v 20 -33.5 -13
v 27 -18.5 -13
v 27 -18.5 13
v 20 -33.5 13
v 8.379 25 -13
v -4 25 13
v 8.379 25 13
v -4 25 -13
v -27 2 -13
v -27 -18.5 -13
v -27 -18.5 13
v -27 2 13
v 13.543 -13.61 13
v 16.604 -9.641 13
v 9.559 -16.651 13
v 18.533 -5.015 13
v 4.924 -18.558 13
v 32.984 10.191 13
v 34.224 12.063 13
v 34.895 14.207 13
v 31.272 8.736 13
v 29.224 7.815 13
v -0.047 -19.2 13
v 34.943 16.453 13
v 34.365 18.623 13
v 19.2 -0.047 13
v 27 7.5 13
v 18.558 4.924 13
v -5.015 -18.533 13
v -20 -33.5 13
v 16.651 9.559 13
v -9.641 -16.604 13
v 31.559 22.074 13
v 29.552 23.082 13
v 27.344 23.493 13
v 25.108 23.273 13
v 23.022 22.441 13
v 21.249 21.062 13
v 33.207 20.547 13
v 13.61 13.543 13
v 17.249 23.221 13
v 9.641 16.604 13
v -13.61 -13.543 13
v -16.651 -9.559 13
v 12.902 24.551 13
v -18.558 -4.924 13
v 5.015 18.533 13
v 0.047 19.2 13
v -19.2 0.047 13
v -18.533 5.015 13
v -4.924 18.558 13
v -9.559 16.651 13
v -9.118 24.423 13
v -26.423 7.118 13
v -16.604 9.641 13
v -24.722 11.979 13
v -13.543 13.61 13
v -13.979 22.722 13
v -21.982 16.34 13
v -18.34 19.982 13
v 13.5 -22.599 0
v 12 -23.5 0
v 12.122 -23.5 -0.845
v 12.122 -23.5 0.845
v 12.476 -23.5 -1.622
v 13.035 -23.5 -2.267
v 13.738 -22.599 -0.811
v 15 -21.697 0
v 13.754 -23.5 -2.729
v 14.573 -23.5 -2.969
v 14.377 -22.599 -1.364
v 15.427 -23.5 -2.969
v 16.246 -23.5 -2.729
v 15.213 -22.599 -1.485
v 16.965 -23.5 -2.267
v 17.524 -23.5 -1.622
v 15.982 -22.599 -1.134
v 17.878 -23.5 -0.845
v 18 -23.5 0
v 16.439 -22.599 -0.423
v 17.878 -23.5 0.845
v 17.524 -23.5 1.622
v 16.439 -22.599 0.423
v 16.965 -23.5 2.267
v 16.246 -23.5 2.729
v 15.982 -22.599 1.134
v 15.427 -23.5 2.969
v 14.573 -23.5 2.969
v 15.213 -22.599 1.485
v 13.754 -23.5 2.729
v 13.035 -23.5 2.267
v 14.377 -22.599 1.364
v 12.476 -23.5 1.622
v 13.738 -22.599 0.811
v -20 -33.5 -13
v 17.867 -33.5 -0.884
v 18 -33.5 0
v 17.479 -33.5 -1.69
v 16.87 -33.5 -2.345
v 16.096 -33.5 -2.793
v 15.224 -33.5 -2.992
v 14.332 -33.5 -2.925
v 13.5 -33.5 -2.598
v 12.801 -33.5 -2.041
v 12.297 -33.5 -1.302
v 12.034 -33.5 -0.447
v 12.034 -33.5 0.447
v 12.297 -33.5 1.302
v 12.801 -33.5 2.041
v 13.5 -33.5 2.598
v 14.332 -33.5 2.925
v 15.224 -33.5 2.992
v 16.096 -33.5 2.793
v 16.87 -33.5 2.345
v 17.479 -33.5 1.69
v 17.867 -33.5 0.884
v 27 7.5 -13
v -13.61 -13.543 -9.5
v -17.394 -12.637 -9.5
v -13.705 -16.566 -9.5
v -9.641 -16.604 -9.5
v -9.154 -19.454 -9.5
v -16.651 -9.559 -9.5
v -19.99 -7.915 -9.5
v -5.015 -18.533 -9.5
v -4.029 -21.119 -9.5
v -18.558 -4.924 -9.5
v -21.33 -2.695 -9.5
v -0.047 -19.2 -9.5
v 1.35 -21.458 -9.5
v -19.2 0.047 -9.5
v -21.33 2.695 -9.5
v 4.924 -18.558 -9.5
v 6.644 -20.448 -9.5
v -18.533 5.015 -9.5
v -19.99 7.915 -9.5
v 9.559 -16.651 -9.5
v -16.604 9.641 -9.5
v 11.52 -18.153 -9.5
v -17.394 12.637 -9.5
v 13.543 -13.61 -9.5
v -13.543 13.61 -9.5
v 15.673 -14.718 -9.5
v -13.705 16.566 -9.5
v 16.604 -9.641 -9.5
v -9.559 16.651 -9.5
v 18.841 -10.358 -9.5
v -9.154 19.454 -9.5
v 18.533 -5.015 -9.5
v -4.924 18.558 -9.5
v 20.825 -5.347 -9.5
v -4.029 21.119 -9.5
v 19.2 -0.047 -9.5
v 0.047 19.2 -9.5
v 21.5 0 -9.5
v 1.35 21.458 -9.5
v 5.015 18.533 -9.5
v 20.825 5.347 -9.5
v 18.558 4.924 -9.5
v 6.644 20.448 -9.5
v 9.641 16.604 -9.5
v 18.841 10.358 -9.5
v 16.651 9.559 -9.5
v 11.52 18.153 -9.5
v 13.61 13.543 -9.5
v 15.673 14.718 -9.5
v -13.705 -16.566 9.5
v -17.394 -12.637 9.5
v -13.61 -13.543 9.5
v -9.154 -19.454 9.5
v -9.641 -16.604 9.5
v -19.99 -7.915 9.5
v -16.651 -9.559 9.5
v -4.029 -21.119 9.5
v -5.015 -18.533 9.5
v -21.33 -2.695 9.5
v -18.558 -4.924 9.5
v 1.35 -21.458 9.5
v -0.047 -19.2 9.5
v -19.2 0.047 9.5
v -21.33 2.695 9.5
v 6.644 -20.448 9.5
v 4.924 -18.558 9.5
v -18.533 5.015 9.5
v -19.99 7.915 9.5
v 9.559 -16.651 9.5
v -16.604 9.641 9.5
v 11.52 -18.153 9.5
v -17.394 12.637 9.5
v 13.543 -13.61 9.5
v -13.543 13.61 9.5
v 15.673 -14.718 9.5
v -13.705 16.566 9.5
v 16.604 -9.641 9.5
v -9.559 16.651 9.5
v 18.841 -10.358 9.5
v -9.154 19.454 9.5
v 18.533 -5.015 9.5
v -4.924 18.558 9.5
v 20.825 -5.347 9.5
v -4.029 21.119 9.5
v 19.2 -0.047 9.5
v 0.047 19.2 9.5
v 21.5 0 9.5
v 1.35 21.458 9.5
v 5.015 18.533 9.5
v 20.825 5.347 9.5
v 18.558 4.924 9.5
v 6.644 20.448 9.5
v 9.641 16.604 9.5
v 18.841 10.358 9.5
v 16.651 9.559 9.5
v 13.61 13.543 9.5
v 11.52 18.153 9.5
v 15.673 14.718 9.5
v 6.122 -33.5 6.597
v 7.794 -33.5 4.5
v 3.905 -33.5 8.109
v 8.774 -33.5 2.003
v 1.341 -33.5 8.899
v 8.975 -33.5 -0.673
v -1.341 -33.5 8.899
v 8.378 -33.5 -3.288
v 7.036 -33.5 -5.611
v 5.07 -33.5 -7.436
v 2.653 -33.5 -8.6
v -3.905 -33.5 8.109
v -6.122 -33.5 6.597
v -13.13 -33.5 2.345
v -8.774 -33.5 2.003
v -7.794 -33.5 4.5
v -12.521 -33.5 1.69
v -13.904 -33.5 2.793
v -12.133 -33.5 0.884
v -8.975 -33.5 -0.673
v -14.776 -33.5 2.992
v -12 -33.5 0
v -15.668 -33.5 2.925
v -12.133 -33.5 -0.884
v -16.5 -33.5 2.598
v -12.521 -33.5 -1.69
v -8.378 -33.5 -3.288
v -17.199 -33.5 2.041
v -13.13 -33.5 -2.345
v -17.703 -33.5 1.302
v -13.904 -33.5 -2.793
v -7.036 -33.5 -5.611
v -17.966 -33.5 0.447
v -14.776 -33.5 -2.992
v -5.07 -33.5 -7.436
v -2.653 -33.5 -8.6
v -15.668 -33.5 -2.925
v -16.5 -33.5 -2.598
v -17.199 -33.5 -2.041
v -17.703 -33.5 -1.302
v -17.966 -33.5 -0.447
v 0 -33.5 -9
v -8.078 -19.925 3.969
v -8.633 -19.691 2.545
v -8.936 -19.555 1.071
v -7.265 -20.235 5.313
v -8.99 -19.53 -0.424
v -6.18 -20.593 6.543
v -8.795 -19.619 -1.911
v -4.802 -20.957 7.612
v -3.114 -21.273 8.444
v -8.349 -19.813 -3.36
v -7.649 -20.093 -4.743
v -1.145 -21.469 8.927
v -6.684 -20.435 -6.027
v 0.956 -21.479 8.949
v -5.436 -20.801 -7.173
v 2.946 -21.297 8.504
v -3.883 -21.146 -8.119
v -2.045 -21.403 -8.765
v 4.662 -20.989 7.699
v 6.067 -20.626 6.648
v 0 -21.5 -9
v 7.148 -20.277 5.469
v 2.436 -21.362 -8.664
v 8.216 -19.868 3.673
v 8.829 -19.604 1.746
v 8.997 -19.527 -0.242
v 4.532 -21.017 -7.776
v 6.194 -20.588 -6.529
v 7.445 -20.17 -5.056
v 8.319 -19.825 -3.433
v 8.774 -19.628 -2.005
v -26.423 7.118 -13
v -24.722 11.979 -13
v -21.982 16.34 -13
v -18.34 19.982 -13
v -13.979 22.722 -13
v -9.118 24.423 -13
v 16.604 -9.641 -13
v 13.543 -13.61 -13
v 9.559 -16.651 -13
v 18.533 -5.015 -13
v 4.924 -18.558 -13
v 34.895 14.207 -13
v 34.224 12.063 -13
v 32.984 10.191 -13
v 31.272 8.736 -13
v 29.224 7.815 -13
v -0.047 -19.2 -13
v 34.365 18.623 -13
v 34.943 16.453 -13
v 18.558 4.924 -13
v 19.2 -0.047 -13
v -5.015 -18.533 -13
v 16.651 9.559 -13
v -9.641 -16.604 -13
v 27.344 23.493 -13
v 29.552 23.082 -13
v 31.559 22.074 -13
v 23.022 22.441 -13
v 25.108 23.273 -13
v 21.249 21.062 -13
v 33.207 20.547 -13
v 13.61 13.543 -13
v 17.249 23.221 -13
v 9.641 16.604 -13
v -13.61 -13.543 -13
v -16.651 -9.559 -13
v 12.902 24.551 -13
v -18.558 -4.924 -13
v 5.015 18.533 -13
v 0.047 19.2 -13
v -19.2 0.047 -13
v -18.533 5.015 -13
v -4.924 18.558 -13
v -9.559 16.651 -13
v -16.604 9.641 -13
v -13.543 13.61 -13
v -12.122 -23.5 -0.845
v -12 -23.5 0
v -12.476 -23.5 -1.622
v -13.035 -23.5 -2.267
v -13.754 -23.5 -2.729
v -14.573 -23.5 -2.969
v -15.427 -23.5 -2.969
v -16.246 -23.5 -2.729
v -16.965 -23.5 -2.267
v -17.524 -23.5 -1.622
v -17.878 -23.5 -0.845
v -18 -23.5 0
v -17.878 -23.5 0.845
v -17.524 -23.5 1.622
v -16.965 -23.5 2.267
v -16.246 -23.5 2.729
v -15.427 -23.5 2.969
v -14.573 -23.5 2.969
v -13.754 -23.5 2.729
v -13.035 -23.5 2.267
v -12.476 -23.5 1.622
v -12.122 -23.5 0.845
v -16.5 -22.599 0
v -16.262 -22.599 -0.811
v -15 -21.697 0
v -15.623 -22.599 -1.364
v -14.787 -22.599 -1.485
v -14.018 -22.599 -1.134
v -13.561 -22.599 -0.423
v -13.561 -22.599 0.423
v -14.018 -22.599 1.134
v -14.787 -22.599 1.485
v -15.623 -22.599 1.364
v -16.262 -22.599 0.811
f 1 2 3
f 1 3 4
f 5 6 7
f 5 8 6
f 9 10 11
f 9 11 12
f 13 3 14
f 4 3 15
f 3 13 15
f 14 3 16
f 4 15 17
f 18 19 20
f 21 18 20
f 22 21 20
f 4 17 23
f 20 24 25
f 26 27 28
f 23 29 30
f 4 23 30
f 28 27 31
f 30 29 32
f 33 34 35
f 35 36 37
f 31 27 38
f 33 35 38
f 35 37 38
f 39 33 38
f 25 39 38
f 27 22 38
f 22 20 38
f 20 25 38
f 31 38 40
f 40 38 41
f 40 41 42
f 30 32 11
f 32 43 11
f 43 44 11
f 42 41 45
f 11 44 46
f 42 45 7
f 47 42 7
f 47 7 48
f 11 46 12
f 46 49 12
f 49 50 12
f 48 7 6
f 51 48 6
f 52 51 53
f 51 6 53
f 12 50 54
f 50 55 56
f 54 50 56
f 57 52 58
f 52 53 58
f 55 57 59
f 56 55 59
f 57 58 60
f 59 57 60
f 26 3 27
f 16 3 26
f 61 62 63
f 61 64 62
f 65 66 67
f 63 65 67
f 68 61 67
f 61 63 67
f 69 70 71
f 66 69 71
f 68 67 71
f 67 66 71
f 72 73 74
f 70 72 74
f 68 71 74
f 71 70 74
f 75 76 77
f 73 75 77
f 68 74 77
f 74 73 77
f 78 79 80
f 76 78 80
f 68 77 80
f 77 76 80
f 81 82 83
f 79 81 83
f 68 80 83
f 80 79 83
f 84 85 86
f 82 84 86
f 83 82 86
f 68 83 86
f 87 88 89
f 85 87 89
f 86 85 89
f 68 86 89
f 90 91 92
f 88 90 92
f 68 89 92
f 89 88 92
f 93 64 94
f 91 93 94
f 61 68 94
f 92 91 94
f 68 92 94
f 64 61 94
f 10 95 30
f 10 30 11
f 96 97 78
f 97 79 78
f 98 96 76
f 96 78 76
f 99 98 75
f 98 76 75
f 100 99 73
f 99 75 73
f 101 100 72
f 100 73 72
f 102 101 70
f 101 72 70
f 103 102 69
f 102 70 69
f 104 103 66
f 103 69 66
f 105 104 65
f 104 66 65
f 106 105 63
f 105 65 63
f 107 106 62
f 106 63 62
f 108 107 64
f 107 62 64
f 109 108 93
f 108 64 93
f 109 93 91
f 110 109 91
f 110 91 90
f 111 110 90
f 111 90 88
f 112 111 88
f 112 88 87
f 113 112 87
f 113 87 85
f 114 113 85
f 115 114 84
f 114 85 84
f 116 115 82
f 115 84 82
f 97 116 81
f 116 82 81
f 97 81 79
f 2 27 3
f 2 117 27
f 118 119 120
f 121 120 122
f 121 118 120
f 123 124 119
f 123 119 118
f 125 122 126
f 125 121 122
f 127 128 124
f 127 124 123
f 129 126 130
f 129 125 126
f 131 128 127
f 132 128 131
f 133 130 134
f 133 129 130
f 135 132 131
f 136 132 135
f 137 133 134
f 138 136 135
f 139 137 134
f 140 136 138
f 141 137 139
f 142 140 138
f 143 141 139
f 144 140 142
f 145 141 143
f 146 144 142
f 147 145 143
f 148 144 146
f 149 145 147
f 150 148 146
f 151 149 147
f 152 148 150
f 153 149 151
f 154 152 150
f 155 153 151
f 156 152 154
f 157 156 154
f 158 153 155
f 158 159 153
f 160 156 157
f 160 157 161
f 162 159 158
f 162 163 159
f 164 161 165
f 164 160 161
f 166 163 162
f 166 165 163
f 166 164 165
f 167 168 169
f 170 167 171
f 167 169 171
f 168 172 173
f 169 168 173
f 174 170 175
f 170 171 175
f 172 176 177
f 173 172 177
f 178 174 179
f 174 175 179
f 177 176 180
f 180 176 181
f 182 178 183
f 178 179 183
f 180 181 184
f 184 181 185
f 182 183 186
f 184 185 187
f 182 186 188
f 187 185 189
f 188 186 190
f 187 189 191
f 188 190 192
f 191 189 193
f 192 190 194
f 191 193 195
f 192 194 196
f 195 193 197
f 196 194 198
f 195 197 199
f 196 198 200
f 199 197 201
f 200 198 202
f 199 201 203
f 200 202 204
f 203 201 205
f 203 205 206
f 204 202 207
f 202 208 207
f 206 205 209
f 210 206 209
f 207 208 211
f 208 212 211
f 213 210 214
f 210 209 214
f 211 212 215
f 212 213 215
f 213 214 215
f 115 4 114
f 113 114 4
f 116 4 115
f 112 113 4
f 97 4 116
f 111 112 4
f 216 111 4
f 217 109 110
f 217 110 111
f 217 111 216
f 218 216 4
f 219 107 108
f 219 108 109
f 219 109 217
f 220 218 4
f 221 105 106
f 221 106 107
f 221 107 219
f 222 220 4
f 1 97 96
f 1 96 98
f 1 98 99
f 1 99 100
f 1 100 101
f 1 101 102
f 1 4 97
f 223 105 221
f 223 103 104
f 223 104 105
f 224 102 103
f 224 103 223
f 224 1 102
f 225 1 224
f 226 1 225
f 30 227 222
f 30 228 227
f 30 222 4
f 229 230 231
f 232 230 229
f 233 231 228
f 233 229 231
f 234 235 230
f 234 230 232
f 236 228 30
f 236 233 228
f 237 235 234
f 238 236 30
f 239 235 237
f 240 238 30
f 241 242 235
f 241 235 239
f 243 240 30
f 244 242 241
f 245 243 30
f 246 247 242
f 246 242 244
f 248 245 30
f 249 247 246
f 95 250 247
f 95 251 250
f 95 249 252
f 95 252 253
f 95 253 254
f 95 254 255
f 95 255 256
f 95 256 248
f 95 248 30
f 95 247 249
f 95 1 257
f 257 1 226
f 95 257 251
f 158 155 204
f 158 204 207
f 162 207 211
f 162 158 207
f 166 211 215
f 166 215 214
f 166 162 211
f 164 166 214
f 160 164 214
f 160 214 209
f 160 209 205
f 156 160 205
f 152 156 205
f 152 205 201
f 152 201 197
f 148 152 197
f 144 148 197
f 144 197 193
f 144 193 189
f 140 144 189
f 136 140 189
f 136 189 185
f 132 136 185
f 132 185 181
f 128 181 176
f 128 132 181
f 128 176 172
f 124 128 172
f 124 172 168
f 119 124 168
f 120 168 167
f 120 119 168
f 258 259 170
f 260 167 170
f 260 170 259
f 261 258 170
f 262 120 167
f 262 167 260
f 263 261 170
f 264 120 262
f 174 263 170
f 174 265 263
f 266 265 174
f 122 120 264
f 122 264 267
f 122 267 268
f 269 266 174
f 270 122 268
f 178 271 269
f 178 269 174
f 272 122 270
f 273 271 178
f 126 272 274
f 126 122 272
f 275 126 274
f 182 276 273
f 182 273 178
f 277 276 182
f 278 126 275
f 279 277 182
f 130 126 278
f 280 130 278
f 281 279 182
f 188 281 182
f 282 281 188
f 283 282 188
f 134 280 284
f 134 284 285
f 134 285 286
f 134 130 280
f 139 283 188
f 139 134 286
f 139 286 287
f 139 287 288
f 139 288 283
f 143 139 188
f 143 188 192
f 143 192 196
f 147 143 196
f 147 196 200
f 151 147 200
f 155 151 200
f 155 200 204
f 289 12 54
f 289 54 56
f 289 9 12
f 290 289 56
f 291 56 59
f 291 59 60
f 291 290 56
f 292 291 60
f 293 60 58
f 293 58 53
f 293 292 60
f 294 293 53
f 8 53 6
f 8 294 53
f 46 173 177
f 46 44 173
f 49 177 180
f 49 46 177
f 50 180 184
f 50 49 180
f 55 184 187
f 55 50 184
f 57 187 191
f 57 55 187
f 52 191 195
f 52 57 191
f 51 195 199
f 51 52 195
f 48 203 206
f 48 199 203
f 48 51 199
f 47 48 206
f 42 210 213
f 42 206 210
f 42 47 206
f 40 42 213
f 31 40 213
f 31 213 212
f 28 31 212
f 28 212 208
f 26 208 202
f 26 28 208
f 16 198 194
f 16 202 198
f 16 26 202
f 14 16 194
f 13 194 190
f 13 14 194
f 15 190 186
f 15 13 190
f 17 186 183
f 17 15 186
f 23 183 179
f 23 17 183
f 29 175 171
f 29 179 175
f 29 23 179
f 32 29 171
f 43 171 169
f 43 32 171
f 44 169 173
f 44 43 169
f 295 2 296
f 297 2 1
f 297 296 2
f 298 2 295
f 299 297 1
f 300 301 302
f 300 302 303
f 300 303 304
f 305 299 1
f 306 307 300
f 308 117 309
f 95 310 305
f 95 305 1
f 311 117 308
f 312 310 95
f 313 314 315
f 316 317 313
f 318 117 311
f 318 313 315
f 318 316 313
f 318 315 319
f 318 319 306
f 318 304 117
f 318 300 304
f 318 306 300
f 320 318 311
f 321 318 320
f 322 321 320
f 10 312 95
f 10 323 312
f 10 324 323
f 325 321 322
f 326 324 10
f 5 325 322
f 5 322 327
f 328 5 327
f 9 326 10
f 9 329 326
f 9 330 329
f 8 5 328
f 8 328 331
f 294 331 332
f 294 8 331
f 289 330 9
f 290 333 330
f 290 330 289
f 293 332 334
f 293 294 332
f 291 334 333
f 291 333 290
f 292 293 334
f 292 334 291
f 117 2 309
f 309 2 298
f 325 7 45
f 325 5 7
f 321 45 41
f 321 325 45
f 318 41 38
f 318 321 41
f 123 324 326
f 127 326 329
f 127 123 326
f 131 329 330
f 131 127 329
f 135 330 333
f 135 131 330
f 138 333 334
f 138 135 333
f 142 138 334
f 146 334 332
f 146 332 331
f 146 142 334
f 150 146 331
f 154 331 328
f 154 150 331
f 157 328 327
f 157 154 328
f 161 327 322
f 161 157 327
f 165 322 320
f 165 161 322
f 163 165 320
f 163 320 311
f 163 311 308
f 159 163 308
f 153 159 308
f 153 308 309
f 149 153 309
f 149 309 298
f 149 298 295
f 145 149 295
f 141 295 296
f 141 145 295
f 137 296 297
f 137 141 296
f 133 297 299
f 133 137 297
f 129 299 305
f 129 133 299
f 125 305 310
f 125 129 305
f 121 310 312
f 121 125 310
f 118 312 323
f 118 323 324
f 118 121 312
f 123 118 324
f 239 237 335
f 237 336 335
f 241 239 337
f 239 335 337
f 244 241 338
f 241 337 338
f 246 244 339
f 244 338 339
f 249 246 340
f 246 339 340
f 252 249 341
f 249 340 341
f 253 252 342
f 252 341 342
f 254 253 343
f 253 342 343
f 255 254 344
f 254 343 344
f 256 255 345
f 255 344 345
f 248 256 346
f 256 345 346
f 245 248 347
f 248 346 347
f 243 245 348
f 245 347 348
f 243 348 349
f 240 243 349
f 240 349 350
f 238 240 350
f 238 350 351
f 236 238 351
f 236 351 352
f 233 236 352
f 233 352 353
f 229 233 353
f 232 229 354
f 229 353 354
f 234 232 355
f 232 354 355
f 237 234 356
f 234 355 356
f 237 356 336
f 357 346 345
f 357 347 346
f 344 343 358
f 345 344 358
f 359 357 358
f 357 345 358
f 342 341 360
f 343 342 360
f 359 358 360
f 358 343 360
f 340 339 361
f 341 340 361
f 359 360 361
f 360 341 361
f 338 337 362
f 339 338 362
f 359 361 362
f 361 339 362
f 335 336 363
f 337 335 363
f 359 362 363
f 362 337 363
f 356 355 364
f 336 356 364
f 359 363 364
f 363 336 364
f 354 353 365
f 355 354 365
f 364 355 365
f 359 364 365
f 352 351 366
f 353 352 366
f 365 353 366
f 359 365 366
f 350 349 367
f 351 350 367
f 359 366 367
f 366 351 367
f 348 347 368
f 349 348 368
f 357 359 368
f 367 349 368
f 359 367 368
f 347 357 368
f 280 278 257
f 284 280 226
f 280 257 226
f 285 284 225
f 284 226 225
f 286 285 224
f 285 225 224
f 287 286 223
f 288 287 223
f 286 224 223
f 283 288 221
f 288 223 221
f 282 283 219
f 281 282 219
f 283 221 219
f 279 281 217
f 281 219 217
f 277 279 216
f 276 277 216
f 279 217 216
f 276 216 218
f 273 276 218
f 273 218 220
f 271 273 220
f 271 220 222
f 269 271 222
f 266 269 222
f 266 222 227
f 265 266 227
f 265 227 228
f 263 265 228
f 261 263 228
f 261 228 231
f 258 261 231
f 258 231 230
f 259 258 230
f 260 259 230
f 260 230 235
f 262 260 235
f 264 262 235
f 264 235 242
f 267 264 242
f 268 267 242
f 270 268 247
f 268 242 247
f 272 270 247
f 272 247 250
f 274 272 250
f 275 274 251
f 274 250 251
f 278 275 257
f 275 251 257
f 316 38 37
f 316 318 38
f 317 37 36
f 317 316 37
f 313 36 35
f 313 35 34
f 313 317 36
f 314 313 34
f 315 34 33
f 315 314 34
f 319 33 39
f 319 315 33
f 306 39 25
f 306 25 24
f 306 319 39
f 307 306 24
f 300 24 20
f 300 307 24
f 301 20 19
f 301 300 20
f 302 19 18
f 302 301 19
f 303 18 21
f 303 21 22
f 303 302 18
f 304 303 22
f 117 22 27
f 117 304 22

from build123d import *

# Parameters (mm, degrees)
BOSS_EXTRUDE1_DEPTH          = 13
CUT_EXTRUDE1_DEPTH           = 9.5
CUT_EXTRUDE1_DEPTH_BACK      = 9.5
SKETCH2_R                    = 21.5
CUT_EXTRUDE2_REACH           = 71.399
CUT_EXTRUDE2_END_RADIUS      = 21.5
SKETCH3_R                    = 9
F_6_0_6_DIAMETER_HOLE1_D     = 6
F_6_0_6_DIAMETER_HOLE1_DEPTH = 10
F_6_0_6_DIAMETER_HOLE1_TIP   = 1.802581857


with BuildPart() as part:
    # Sketch1 → Boss-Extrude1 (new, symmetric)
    with BuildSketch(Plane(origin=(0, 0, 0), x_dir=(-1, 0, 0), z_dir=(0, 0, -1))):
        with BuildLine():
            Line((-27, 7.5), (-27, -18.5))
            Line((-27, -18.5), (-20, -33.5))
            Line((-20, -33.5), (20, -33.5))
            Line((20, -33.5), (27, -18.5))
            Line((27, -18.5), (27, -15.5))
            Line((27, -15.5), (27, 2))
            ThreePointArc((27, 2), (20.263455967, 18.263455967), (4, 25))
            Line((4, 25), (-8.37877555, 25))
            ThreePointArc((-8.37877555, 25), (-15.10867012, 23.993374436), (-21.249479132, 21.061610355))
            ThreePointArc((-21.249479132, 21.061610355), (-34.365218355, 18.623068776), (-27, 7.5))
        make_face()
        with BuildLine():
            ThreePointArc((-16.651259459, 9.559056356), (-9.559056356, -16.651259459), (16.651259459, -9.559056356))
            ThreePointArc((16.651259459, -9.559056356), (9.559056356, 16.651259459), (-16.651259459, 9.559056356))
        make_face(mode=Mode.SUBTRACT)
    extrude(amount=BOSS_EXTRUDE1_DEPTH, both=True)

    # Sketch2 → Cut-Extrude1 (cut, two sides: drawn at the far end of the back side and taken through both)
    with BuildSketch(Plane.XY.offset(-CUT_EXTRUDE1_DEPTH_BACK)):
        Circle(SKETCH2_R)
    extrude(amount=CUT_EXTRUDE1_DEPTH + CUT_EXTRUDE1_DEPTH_BACK, mode=Mode.SUBTRACT)

    # Cut-Extrude2: up to this cylinder (the profile starts outside it)
    cut_extrude2_end = Plane(origin=(0, 0, 0), z_dir=(0, 0, -1)) * Cylinder(CUT_EXTRUDE2_END_RADIUS, 186.798, mode=Mode.PRIVATE)
    # Sketch3 → Cut-Extrude2 (cut, up to the surface)
    with BuildSketch(Plane.XZ.offset(33.5), mode=Mode.PRIVATE) as cut_extrude2_sk1:
        with Locations(Location((0, 0, 0), (0, 0, 270))):
            Circle(SKETCH3_R)
    cut_extrude2_tool1 = extrude(cut_extrude2_sk1.sketch, amount=-CUT_EXTRUDE2_REACH, mode=Mode.PRIVATE) - cut_extrude2_end
    add(cut_extrude2_tool1.solids().sort_by_distance((0, -33.5, 0))[0], mode=Mode.SUBTRACT)

    # Ø6.0 (6) Diameter Hole1
    with Locations(Plane(origin=(0, -33.5, 0), x_dir=(-1, 0, 0), z_dir=(0, -1, 0))):
        with Locations((-15, 0), (15, 0)):
            Hole(F_6_0_6_DIAMETER_HOLE1_D / 2, depth=F_6_0_6_DIAMETER_HOLE1_DEPTH)
            with Locations((0, 0, -(F_6_0_6_DIAMETER_HOLE1_DEPTH + F_6_0_6_DIAMETER_HOLE1_TIP / 2))):  # 118° drill point
                Cone(0, F_6_0_6_DIAMETER_HOLE1_D / 2, F_6_0_6_DIAMETER_HOLE1_TIP, mode=Mode.SUBTRACT)


solid = part.part
